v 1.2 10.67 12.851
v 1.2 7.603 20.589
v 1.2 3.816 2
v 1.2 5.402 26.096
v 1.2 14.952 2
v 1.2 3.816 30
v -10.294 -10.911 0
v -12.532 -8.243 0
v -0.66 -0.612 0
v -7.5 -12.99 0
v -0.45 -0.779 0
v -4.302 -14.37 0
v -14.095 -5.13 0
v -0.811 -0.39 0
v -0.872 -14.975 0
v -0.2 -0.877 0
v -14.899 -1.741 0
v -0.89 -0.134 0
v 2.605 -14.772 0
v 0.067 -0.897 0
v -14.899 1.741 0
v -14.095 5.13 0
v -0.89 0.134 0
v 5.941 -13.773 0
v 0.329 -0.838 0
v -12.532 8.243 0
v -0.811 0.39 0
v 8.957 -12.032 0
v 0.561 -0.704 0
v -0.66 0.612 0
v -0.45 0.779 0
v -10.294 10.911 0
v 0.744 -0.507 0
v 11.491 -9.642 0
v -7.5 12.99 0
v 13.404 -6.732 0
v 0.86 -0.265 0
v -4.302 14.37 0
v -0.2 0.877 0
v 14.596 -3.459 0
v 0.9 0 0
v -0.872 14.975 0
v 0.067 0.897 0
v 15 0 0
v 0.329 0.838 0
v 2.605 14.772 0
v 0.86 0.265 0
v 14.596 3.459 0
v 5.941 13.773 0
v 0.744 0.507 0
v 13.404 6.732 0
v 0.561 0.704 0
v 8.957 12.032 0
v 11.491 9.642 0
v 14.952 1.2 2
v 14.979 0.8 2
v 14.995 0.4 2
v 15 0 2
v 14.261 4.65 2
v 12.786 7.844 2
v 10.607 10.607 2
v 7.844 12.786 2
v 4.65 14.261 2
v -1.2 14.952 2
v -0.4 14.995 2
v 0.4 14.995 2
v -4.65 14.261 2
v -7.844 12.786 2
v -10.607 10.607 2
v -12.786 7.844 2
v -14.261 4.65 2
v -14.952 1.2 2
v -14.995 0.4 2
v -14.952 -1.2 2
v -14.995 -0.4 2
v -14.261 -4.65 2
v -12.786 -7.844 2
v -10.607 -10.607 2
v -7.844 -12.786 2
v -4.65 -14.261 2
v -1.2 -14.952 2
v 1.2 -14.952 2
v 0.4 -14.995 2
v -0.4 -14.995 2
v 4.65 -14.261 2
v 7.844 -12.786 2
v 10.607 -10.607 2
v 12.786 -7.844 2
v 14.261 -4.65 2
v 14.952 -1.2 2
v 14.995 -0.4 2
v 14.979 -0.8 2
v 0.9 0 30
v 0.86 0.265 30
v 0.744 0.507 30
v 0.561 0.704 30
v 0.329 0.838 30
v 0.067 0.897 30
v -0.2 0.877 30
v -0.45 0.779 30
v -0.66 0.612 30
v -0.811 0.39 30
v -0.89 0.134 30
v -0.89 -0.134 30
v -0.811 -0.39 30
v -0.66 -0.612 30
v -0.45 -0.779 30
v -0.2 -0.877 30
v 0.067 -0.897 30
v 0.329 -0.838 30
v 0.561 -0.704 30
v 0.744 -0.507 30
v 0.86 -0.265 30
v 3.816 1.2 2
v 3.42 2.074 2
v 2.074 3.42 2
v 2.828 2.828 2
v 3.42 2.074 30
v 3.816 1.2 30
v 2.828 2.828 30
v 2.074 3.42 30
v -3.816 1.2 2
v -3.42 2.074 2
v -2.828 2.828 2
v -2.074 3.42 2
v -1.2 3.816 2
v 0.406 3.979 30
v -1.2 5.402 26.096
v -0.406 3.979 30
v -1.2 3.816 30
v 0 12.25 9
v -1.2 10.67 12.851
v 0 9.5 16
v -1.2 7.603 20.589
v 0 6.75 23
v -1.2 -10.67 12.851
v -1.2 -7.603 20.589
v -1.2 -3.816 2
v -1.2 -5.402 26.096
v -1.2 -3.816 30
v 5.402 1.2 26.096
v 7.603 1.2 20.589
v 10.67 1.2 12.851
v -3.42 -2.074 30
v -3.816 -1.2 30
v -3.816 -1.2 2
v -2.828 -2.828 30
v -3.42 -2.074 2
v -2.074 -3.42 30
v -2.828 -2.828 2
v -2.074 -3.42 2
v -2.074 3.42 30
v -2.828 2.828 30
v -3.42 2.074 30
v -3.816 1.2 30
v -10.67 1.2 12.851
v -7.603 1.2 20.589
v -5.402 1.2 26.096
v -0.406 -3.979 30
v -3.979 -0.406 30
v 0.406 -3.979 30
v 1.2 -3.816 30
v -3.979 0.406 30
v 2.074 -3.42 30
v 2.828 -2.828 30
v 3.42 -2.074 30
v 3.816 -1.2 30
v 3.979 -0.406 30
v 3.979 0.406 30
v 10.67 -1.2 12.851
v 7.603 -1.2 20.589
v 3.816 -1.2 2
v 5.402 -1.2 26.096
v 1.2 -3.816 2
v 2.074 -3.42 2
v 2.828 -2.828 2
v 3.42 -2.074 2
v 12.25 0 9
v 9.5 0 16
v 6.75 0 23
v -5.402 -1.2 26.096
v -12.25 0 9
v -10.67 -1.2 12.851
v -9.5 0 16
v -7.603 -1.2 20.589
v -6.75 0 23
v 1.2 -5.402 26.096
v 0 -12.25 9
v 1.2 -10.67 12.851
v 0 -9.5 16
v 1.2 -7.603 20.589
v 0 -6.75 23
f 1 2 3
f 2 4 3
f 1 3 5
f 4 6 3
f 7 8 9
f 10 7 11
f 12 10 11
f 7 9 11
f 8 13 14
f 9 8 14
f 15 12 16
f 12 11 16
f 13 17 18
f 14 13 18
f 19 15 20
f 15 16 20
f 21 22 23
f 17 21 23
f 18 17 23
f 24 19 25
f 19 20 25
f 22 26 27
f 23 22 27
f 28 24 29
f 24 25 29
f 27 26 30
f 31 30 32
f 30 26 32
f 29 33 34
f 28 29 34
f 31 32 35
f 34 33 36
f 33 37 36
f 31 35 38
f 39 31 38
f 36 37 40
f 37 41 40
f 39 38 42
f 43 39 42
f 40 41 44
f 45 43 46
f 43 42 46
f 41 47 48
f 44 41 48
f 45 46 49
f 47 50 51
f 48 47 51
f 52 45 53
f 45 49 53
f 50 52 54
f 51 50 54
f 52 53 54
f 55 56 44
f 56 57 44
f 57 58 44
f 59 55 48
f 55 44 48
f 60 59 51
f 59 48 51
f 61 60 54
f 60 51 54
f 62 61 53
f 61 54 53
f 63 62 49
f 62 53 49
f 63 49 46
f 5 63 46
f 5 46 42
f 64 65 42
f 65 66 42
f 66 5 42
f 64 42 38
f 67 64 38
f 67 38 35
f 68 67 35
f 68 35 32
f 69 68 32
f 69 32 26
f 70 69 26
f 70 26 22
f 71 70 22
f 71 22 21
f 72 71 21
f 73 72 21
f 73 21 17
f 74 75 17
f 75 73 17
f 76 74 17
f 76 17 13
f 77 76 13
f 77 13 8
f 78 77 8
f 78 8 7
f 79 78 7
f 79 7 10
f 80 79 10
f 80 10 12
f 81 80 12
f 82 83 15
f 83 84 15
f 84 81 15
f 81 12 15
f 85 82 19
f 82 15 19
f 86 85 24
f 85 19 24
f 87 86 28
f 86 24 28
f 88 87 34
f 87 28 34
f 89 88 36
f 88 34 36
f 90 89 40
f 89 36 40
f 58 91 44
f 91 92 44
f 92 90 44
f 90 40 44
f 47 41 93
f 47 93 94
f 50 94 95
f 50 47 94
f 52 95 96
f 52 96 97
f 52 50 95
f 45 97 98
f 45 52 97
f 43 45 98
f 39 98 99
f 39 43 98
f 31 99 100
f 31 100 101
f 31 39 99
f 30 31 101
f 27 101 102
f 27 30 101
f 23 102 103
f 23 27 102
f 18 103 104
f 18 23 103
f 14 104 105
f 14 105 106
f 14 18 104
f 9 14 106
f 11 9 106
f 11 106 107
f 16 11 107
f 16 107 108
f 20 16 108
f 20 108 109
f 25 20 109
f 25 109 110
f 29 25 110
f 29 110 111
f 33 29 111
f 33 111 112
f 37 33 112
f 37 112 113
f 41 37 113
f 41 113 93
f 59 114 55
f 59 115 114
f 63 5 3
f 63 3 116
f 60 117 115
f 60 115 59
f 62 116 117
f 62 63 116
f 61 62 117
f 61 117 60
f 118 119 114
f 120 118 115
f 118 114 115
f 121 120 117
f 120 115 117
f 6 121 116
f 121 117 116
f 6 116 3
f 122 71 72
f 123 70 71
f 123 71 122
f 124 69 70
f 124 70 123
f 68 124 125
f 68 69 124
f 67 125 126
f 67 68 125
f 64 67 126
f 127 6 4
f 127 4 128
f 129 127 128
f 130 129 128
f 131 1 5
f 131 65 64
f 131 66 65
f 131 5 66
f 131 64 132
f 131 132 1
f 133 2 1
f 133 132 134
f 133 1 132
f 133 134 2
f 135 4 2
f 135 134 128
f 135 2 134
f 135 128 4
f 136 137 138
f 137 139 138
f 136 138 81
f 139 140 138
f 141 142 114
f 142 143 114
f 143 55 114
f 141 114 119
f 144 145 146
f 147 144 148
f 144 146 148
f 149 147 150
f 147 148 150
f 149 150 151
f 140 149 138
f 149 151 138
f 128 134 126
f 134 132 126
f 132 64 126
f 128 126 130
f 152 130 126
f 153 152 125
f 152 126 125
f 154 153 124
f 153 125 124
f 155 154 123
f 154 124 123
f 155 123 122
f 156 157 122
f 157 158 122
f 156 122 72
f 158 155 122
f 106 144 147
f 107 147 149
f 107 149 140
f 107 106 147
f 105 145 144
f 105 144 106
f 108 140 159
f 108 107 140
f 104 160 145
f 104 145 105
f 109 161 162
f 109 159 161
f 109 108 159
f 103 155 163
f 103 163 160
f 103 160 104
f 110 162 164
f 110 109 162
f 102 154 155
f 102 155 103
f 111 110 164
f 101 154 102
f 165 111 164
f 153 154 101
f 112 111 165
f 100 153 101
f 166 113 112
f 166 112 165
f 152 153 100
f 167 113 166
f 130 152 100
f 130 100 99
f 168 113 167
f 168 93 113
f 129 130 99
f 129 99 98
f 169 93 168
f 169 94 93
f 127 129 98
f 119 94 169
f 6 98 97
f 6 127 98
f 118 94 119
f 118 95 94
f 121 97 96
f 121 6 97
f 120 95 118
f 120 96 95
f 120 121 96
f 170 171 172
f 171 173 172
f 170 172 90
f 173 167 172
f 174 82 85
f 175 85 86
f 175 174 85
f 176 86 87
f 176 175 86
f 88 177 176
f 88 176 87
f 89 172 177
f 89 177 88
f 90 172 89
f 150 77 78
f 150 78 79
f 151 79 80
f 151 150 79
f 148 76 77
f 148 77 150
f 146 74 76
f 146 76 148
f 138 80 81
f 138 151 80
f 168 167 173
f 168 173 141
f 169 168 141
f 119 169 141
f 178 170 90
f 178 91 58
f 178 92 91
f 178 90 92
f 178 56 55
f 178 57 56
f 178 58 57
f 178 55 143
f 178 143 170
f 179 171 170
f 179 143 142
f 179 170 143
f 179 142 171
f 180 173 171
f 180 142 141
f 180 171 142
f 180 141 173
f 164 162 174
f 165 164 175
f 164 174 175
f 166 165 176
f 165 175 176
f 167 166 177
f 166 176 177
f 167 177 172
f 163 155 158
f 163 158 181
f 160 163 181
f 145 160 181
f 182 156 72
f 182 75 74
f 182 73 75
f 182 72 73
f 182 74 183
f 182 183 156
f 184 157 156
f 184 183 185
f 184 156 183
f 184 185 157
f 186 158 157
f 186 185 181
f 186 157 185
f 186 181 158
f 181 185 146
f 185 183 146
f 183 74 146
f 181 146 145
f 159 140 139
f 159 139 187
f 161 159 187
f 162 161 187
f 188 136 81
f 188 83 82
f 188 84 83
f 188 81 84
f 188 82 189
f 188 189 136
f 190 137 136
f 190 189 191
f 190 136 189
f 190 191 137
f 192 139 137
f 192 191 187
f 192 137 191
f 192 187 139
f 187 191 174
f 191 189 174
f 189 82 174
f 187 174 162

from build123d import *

# Parameters (mm, degrees)
SKETCH1_R           = 15
SKETCH1_R_2         = 0.9
BOSS_EXTRUDE1_DEPTH = 2
SKETCH1_3_R         = 4
SKETCH1_3_R_2       = 0.9
BOSS_EXTRUDE2_DEPTH = 30
BOSS_EXTRUDE3_DEPTH = 28
CHAMFER1_SIZE       = 28
CHAMFER1_SIZE_2     = 11


with BuildPart() as part:
    # Sketch1 → Boss-Extrude1 (new body)
    with BuildSketch(Plane.XY):
        Circle(SKETCH1_R)
        Circle(SKETCH1_R_2, mode=Mode.SUBTRACT)
    extrude(amount=BOSS_EXTRUDE1_DEPTH)

    # Sketch1<3> → Boss-Extrude2 (add)
    with BuildSketch(Plane.XY):
        Circle(SKETCH1_3_R)
        Circle(SKETCH1_3_R_2, mode=Mode.SUBTRACT)
    extrude(amount=BOSS_EXTRUDE2_DEPTH)

    # Sketch2 → Boss-Extrude3 (add)
    with BuildSketch(Plane.XY.offset(2)):
        with BuildLine():
            ThreePointArc((1.2, 14.951922953), (0, 15), (-1.2, 14.951922953))
            Line((-1.2, 14.951922953), (-1.2, 3.815756806))
            ThreePointArc((-1.2, 3.815756806), (0, 4), (1.2, 3.815756806))
            Line((1.2, 3.815756806), (1.2, 14.951922953))
        make_face()
        with BuildLine():
            Line((-3.815756806, 1.2), (-14.951922953, 1.2))
            ThreePointArc((-14.951922953, 1.2), (-15, 0), (-14.951922953, -1.2))
            Line((-14.951922953, -1.2), (-3.815756806, -1.2))
            ThreePointArc((-3.815756806, -1.2), (-4, 0), (-3.815756806, 1.2))
        make_face()
        with BuildLine():
            ThreePointArc((14.951922953, -1.2), (15, 0), (14.951922953, 1.2))
            Line((14.951922953, 1.2), (3.815756806, 1.2))
            ThreePointArc((3.815756806, 1.2), (4, 0), (3.815756806, -1.2))
            Line((3.815756806, -1.2), (14.951922953, -1.2))
        make_face()
        with BuildLine():
            Line((-1.2, -3.815756806), (-1.2, -14.951922953))
            ThreePointArc((-1.2, -14.951922953), (0, -15), (1.2, -14.951922953))
            Line((1.2, -14.951922953), (1.2, -3.815756806))
            ThreePointArc((1.2, -3.815756806), (0, -4), (-1.2, -3.815756806))
        make_face()
    extrude(amount=BOSS_EXTRUDE3_DEPTH)

    # Chamfer1
    # the kernel refuses this chamfer: 28, 11 mm, written as the material it takes off along each edge
    with BuildSketch(Plane(origin=(0, 0, 30), x_dir=(0.9999950652018581, 0.0031415874858912577, 0), z_dir=(0.0031415874858912577, -0.9999950652018581, 0))) as chamfer1_piece_1:
        Polygon((15, -CHAMFER1_SIZE), (15 - CHAMFER1_SIZE_2, 0), (15, 0), align=None)
    revolve(axis=Axis((0, 0, 30), (0, 0, 1)), revolution_arc=359.64, mode=Mode.SUBTRACT)
    with BuildSketch(Plane(origin=(0, 0, 30), x_dir=(0.0031415874858795345, -0.9999950652018582, 0), z_dir=(-0.9999950652018582, -0.0031415874858795345, 0))) as chamfer1_piece_2:
        Polygon((15, -CHAMFER1_SIZE), (15 - CHAMFER1_SIZE_2, 0), (15, 0), align=None)
    revolve(axis=Axis((0, 0, 30), (0, 0, 1)), revolution_arc=359.64, mode=Mode.SUBTRACT)
    with BuildSketch(Plane(origin=(0, 0, 30), x_dir=(-0.9999950652018582, -0.00314158748587628, 0), z_dir=(-0.00314158748587628, 0.9999950652018582, 0))) as chamfer1_piece_3:
        Polygon((15, -CHAMFER1_SIZE), (15 - CHAMFER1_SIZE_2, 0), (15, 0), align=None)
    revolve(axis=Axis((0, 0, 30), (0, 0, 1)), revolution_arc=359.64, mode=Mode.SUBTRACT)
    with BuildSketch(Plane(origin=(0, 0, 30), x_dir=(-0.003141587485897415, 0.9999950652018581, 0), z_dir=(0.9999950652018581, 0.003141587485897415, 0))) as chamfer1_piece_4:
        Polygon((15, -CHAMFER1_SIZE), (15 - CHAMFER1_SIZE_2, 0), (15, 0), align=None)
    revolve(axis=Axis((0, 0, 30), (0, 0, 1)), revolution_arc=359.64, mode=Mode.SUBTRACT)


solid = part.part
